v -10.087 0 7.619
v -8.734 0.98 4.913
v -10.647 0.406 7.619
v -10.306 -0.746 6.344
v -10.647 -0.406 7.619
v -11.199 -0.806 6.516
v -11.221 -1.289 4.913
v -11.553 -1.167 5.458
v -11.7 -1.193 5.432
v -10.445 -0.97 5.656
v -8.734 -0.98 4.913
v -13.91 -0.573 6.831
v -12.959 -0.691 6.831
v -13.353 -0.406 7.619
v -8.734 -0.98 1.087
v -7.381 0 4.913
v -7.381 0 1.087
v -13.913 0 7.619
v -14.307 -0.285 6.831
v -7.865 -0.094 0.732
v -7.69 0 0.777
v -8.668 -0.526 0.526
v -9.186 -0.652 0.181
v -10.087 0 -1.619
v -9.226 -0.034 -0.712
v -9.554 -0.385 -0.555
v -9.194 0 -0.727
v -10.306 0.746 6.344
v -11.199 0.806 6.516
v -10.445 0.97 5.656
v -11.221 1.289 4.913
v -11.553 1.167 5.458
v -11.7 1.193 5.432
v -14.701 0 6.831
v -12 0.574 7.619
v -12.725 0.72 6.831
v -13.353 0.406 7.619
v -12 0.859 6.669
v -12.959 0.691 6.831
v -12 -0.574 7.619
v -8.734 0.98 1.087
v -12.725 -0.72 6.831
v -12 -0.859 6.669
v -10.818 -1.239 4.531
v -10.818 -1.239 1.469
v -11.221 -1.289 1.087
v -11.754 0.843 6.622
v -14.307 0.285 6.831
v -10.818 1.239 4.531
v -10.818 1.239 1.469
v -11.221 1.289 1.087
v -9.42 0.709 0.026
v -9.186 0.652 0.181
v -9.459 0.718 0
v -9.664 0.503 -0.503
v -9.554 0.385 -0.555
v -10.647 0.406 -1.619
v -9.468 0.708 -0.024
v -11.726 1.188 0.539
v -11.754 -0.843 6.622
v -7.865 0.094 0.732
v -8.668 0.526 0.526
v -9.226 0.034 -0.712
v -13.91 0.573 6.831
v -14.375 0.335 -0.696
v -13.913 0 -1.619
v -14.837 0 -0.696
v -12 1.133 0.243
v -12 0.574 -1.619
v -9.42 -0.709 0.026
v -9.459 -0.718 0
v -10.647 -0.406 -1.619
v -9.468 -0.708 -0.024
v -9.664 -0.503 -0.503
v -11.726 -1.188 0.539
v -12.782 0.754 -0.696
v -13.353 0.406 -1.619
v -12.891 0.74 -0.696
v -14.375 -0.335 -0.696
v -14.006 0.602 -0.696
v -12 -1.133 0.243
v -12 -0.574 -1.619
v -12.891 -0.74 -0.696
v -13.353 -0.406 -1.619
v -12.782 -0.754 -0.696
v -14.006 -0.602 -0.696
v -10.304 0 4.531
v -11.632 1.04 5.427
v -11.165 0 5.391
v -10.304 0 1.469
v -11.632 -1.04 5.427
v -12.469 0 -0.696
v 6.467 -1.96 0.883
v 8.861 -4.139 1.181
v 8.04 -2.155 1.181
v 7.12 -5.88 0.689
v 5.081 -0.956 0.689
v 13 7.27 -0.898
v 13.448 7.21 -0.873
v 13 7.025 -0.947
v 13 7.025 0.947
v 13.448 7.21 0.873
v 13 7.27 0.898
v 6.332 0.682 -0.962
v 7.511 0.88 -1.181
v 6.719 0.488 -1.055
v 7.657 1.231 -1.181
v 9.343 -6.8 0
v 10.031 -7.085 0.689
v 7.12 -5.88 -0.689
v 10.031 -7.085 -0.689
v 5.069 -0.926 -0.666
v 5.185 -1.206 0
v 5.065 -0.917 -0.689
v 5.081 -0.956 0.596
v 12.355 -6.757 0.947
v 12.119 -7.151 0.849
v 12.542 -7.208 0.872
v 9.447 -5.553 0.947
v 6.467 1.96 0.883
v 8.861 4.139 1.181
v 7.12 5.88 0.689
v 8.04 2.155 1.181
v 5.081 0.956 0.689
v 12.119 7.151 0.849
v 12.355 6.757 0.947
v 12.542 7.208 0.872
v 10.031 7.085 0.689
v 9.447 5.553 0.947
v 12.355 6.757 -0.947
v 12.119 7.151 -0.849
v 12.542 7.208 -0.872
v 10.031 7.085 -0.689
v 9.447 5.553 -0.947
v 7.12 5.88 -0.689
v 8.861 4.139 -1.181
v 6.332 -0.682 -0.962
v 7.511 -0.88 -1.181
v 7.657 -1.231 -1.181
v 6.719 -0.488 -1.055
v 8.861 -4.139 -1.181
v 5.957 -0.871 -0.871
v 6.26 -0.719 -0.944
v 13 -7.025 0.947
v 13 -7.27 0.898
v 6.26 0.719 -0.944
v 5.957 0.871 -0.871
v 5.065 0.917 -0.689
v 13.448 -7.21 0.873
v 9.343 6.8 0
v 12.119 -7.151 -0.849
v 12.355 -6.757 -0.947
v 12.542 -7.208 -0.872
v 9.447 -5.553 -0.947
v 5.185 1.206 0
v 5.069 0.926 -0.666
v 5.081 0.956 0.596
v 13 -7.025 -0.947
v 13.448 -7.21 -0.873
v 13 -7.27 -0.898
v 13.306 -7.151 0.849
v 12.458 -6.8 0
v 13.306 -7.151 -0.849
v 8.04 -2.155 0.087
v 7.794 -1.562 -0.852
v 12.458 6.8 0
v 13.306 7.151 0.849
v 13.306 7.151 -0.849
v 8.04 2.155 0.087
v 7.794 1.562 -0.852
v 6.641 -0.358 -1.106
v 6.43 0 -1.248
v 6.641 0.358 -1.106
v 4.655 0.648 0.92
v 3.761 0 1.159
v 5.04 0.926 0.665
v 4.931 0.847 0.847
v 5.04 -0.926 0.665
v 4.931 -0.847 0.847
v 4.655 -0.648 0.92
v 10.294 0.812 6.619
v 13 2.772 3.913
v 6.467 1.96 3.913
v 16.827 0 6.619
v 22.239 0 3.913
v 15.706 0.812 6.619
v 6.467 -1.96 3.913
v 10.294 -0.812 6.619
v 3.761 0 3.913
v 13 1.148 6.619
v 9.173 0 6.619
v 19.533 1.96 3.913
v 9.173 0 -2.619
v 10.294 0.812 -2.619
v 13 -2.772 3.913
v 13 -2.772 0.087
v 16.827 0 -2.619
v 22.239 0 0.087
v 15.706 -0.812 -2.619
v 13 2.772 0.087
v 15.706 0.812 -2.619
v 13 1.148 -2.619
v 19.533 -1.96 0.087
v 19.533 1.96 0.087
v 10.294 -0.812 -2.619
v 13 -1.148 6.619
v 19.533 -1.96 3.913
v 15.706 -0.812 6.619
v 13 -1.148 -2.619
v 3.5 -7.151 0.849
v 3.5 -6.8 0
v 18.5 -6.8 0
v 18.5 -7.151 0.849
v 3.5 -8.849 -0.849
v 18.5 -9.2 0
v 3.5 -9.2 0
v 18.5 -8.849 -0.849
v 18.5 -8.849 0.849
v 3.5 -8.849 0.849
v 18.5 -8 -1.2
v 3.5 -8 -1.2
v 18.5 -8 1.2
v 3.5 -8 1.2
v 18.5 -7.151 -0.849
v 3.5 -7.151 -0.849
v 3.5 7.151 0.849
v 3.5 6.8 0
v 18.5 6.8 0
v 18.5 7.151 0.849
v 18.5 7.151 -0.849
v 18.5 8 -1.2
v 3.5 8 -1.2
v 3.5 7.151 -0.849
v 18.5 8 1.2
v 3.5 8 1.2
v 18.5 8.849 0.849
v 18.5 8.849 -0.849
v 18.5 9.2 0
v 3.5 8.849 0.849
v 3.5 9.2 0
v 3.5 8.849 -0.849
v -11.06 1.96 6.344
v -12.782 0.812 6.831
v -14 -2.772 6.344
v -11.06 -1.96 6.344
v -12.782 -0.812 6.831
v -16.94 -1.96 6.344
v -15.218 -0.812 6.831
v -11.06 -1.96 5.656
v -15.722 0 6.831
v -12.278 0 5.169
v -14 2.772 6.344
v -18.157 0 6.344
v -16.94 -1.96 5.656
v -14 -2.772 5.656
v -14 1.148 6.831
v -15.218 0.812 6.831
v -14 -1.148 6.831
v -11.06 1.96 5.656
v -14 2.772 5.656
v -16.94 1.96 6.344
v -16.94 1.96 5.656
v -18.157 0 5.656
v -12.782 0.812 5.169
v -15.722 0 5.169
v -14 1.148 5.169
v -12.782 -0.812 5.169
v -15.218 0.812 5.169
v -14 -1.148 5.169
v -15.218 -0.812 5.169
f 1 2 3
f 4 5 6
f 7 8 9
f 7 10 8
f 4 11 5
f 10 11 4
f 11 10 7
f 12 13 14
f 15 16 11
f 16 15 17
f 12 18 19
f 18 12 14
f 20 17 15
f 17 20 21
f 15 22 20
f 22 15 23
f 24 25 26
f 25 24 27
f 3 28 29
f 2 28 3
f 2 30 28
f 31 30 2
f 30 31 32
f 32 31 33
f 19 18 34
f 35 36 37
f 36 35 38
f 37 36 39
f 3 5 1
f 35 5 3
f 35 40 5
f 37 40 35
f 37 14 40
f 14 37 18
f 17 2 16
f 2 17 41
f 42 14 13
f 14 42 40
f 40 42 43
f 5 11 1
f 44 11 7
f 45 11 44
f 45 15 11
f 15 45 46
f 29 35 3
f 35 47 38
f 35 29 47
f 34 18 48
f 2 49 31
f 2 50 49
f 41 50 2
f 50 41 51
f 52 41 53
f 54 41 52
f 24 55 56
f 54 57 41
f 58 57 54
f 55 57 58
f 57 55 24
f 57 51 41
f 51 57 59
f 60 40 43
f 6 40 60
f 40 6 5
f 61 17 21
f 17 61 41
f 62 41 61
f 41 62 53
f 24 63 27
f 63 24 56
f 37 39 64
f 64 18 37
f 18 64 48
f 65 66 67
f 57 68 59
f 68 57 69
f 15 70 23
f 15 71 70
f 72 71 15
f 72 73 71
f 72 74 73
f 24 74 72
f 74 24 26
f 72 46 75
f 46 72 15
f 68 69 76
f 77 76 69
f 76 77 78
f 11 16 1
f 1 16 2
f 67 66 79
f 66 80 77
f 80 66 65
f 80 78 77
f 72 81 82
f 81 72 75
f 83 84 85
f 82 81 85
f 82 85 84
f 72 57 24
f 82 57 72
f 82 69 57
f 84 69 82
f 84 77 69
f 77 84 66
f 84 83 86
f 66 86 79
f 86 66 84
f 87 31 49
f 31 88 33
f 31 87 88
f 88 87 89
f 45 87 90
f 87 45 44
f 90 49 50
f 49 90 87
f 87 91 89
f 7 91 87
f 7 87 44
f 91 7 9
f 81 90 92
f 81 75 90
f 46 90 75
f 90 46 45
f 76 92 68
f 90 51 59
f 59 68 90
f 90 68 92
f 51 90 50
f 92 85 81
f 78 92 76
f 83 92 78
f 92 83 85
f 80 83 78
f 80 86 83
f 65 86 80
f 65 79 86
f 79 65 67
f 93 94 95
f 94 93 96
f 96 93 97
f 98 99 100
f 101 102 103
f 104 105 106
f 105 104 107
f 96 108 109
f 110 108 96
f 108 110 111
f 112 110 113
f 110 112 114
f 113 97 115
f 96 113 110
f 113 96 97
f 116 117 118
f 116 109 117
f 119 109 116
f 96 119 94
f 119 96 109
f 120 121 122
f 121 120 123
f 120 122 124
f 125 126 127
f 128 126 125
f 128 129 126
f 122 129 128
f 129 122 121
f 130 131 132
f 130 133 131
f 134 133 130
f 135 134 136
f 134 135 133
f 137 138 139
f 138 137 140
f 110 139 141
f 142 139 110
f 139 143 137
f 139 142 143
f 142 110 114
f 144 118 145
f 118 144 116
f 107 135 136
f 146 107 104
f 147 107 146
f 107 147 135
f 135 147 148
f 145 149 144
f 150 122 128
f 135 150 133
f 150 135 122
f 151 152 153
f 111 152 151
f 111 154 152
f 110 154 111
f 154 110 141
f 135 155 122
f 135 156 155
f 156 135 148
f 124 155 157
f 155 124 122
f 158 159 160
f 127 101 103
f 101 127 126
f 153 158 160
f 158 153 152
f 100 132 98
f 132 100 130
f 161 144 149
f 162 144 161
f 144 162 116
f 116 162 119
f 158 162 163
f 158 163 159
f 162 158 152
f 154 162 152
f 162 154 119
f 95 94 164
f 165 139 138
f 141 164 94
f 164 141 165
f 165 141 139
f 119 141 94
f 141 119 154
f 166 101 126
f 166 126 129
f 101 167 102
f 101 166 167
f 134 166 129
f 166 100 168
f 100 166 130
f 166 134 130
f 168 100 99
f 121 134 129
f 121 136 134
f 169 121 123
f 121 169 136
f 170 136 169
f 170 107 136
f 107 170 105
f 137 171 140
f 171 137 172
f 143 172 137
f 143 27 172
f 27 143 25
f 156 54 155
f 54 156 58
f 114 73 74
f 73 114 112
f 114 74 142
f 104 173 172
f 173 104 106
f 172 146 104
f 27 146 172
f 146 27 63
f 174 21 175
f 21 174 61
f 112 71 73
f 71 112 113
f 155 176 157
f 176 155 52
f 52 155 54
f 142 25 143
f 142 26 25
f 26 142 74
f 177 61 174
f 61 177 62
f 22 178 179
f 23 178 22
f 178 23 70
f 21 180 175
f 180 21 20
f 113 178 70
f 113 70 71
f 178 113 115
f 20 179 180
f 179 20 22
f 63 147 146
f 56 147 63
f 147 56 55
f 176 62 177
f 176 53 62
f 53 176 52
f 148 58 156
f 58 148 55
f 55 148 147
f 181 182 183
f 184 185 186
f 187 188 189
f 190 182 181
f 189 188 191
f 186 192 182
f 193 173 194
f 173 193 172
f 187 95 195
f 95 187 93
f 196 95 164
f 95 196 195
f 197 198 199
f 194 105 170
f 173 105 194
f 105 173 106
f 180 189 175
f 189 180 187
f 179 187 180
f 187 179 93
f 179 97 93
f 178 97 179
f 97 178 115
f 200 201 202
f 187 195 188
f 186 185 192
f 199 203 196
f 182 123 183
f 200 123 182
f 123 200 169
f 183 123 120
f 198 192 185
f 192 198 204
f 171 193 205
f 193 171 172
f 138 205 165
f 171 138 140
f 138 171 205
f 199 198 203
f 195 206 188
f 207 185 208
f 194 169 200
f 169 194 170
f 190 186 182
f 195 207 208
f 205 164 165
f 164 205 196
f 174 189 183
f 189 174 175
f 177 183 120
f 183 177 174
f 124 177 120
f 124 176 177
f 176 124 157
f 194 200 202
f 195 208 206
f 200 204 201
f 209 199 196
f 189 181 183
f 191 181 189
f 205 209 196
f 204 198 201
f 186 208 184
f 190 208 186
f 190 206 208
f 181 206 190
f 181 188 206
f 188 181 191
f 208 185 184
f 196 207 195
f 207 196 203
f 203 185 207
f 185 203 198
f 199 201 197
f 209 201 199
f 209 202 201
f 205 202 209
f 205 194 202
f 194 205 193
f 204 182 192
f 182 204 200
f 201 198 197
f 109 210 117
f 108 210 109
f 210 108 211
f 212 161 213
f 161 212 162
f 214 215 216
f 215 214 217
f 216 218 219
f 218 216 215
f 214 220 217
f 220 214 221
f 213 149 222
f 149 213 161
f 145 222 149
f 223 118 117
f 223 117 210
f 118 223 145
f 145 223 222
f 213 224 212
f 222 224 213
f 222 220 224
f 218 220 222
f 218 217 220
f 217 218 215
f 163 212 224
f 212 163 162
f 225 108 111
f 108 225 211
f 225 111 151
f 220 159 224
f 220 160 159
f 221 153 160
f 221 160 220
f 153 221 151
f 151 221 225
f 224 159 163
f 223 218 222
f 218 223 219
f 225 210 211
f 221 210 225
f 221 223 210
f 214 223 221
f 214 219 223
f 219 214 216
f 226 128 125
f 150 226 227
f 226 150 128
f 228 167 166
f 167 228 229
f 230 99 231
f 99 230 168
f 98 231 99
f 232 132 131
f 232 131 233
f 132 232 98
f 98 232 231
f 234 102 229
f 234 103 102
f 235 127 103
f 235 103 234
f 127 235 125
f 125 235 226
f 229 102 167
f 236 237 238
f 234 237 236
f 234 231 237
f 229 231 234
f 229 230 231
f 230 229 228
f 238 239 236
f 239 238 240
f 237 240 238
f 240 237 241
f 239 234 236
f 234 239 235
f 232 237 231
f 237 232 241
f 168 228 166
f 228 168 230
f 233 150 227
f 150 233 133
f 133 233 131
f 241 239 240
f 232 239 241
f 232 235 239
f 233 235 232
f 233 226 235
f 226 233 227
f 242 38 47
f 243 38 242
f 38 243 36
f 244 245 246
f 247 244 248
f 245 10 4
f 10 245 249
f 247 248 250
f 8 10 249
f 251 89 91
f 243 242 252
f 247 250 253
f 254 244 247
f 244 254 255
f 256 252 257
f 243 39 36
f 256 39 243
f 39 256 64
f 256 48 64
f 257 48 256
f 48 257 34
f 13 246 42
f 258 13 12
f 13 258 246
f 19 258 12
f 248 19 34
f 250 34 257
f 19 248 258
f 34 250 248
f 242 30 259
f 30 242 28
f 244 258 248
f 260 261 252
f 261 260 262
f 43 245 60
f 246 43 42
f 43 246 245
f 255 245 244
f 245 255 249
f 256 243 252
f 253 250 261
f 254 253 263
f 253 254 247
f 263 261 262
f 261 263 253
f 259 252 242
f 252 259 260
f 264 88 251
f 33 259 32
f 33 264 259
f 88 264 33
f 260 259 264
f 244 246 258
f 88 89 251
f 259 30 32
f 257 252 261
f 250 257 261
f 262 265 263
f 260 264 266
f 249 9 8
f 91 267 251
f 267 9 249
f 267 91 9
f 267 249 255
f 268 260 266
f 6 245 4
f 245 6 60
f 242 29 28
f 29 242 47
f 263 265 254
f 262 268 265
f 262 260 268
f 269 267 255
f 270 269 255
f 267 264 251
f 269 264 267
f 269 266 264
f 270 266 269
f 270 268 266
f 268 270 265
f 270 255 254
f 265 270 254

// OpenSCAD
module fuselage()
{	
	translate(v = [-2, 0, 0])
	rotate(a = 90, v = [0, 1, 0])
		cylinder(h = 24, r1 = 1.5, r2 =0.7, center = true);
	translate(v = [12, 0, 3])
	difference() {
		scale(v = [1, 0.3, 1])
			sphere(r = 5);
		translate(v = [2, 0, 0])
			scale(v = [1, 1, 1])
				sphere(r = 4);
	}
	translate(v = [-13, 0, 0])
		difference() {
			scale(v = [1, 1, 0.2])
				sphere(r = 9);
			translate(v = [-2, 0, 0])
			scale(v = [1, 1, 1])
				sphere(r = 8.5);
		}
	translate(v = [-13, 0, 2.0])
		scale(v = [2, 0.6, 1])
			sphere(r = 5);
	translate(v = [-11, 8, 0])
		rotate(a = 90, v = [0, 1, 0])
			cylinder(h = 15, r1 = 1.2, r2 = 1.2, center = true);
	translate(v = [-11, -8, 0])
		rotate(a = 90, v = [0, 1, 0])
			cylinder(h = 15, r1 = 1.2, r2 = 1.2, center = true);
	translate(v = [14, 0, 6])
		scale(v = [1.5, 1, 0.3])
			sphere(r = 3);
}

$fn=8;

union() {
	rotate(a = 180, v = [0, 0, 1])
		fuselage();
}
